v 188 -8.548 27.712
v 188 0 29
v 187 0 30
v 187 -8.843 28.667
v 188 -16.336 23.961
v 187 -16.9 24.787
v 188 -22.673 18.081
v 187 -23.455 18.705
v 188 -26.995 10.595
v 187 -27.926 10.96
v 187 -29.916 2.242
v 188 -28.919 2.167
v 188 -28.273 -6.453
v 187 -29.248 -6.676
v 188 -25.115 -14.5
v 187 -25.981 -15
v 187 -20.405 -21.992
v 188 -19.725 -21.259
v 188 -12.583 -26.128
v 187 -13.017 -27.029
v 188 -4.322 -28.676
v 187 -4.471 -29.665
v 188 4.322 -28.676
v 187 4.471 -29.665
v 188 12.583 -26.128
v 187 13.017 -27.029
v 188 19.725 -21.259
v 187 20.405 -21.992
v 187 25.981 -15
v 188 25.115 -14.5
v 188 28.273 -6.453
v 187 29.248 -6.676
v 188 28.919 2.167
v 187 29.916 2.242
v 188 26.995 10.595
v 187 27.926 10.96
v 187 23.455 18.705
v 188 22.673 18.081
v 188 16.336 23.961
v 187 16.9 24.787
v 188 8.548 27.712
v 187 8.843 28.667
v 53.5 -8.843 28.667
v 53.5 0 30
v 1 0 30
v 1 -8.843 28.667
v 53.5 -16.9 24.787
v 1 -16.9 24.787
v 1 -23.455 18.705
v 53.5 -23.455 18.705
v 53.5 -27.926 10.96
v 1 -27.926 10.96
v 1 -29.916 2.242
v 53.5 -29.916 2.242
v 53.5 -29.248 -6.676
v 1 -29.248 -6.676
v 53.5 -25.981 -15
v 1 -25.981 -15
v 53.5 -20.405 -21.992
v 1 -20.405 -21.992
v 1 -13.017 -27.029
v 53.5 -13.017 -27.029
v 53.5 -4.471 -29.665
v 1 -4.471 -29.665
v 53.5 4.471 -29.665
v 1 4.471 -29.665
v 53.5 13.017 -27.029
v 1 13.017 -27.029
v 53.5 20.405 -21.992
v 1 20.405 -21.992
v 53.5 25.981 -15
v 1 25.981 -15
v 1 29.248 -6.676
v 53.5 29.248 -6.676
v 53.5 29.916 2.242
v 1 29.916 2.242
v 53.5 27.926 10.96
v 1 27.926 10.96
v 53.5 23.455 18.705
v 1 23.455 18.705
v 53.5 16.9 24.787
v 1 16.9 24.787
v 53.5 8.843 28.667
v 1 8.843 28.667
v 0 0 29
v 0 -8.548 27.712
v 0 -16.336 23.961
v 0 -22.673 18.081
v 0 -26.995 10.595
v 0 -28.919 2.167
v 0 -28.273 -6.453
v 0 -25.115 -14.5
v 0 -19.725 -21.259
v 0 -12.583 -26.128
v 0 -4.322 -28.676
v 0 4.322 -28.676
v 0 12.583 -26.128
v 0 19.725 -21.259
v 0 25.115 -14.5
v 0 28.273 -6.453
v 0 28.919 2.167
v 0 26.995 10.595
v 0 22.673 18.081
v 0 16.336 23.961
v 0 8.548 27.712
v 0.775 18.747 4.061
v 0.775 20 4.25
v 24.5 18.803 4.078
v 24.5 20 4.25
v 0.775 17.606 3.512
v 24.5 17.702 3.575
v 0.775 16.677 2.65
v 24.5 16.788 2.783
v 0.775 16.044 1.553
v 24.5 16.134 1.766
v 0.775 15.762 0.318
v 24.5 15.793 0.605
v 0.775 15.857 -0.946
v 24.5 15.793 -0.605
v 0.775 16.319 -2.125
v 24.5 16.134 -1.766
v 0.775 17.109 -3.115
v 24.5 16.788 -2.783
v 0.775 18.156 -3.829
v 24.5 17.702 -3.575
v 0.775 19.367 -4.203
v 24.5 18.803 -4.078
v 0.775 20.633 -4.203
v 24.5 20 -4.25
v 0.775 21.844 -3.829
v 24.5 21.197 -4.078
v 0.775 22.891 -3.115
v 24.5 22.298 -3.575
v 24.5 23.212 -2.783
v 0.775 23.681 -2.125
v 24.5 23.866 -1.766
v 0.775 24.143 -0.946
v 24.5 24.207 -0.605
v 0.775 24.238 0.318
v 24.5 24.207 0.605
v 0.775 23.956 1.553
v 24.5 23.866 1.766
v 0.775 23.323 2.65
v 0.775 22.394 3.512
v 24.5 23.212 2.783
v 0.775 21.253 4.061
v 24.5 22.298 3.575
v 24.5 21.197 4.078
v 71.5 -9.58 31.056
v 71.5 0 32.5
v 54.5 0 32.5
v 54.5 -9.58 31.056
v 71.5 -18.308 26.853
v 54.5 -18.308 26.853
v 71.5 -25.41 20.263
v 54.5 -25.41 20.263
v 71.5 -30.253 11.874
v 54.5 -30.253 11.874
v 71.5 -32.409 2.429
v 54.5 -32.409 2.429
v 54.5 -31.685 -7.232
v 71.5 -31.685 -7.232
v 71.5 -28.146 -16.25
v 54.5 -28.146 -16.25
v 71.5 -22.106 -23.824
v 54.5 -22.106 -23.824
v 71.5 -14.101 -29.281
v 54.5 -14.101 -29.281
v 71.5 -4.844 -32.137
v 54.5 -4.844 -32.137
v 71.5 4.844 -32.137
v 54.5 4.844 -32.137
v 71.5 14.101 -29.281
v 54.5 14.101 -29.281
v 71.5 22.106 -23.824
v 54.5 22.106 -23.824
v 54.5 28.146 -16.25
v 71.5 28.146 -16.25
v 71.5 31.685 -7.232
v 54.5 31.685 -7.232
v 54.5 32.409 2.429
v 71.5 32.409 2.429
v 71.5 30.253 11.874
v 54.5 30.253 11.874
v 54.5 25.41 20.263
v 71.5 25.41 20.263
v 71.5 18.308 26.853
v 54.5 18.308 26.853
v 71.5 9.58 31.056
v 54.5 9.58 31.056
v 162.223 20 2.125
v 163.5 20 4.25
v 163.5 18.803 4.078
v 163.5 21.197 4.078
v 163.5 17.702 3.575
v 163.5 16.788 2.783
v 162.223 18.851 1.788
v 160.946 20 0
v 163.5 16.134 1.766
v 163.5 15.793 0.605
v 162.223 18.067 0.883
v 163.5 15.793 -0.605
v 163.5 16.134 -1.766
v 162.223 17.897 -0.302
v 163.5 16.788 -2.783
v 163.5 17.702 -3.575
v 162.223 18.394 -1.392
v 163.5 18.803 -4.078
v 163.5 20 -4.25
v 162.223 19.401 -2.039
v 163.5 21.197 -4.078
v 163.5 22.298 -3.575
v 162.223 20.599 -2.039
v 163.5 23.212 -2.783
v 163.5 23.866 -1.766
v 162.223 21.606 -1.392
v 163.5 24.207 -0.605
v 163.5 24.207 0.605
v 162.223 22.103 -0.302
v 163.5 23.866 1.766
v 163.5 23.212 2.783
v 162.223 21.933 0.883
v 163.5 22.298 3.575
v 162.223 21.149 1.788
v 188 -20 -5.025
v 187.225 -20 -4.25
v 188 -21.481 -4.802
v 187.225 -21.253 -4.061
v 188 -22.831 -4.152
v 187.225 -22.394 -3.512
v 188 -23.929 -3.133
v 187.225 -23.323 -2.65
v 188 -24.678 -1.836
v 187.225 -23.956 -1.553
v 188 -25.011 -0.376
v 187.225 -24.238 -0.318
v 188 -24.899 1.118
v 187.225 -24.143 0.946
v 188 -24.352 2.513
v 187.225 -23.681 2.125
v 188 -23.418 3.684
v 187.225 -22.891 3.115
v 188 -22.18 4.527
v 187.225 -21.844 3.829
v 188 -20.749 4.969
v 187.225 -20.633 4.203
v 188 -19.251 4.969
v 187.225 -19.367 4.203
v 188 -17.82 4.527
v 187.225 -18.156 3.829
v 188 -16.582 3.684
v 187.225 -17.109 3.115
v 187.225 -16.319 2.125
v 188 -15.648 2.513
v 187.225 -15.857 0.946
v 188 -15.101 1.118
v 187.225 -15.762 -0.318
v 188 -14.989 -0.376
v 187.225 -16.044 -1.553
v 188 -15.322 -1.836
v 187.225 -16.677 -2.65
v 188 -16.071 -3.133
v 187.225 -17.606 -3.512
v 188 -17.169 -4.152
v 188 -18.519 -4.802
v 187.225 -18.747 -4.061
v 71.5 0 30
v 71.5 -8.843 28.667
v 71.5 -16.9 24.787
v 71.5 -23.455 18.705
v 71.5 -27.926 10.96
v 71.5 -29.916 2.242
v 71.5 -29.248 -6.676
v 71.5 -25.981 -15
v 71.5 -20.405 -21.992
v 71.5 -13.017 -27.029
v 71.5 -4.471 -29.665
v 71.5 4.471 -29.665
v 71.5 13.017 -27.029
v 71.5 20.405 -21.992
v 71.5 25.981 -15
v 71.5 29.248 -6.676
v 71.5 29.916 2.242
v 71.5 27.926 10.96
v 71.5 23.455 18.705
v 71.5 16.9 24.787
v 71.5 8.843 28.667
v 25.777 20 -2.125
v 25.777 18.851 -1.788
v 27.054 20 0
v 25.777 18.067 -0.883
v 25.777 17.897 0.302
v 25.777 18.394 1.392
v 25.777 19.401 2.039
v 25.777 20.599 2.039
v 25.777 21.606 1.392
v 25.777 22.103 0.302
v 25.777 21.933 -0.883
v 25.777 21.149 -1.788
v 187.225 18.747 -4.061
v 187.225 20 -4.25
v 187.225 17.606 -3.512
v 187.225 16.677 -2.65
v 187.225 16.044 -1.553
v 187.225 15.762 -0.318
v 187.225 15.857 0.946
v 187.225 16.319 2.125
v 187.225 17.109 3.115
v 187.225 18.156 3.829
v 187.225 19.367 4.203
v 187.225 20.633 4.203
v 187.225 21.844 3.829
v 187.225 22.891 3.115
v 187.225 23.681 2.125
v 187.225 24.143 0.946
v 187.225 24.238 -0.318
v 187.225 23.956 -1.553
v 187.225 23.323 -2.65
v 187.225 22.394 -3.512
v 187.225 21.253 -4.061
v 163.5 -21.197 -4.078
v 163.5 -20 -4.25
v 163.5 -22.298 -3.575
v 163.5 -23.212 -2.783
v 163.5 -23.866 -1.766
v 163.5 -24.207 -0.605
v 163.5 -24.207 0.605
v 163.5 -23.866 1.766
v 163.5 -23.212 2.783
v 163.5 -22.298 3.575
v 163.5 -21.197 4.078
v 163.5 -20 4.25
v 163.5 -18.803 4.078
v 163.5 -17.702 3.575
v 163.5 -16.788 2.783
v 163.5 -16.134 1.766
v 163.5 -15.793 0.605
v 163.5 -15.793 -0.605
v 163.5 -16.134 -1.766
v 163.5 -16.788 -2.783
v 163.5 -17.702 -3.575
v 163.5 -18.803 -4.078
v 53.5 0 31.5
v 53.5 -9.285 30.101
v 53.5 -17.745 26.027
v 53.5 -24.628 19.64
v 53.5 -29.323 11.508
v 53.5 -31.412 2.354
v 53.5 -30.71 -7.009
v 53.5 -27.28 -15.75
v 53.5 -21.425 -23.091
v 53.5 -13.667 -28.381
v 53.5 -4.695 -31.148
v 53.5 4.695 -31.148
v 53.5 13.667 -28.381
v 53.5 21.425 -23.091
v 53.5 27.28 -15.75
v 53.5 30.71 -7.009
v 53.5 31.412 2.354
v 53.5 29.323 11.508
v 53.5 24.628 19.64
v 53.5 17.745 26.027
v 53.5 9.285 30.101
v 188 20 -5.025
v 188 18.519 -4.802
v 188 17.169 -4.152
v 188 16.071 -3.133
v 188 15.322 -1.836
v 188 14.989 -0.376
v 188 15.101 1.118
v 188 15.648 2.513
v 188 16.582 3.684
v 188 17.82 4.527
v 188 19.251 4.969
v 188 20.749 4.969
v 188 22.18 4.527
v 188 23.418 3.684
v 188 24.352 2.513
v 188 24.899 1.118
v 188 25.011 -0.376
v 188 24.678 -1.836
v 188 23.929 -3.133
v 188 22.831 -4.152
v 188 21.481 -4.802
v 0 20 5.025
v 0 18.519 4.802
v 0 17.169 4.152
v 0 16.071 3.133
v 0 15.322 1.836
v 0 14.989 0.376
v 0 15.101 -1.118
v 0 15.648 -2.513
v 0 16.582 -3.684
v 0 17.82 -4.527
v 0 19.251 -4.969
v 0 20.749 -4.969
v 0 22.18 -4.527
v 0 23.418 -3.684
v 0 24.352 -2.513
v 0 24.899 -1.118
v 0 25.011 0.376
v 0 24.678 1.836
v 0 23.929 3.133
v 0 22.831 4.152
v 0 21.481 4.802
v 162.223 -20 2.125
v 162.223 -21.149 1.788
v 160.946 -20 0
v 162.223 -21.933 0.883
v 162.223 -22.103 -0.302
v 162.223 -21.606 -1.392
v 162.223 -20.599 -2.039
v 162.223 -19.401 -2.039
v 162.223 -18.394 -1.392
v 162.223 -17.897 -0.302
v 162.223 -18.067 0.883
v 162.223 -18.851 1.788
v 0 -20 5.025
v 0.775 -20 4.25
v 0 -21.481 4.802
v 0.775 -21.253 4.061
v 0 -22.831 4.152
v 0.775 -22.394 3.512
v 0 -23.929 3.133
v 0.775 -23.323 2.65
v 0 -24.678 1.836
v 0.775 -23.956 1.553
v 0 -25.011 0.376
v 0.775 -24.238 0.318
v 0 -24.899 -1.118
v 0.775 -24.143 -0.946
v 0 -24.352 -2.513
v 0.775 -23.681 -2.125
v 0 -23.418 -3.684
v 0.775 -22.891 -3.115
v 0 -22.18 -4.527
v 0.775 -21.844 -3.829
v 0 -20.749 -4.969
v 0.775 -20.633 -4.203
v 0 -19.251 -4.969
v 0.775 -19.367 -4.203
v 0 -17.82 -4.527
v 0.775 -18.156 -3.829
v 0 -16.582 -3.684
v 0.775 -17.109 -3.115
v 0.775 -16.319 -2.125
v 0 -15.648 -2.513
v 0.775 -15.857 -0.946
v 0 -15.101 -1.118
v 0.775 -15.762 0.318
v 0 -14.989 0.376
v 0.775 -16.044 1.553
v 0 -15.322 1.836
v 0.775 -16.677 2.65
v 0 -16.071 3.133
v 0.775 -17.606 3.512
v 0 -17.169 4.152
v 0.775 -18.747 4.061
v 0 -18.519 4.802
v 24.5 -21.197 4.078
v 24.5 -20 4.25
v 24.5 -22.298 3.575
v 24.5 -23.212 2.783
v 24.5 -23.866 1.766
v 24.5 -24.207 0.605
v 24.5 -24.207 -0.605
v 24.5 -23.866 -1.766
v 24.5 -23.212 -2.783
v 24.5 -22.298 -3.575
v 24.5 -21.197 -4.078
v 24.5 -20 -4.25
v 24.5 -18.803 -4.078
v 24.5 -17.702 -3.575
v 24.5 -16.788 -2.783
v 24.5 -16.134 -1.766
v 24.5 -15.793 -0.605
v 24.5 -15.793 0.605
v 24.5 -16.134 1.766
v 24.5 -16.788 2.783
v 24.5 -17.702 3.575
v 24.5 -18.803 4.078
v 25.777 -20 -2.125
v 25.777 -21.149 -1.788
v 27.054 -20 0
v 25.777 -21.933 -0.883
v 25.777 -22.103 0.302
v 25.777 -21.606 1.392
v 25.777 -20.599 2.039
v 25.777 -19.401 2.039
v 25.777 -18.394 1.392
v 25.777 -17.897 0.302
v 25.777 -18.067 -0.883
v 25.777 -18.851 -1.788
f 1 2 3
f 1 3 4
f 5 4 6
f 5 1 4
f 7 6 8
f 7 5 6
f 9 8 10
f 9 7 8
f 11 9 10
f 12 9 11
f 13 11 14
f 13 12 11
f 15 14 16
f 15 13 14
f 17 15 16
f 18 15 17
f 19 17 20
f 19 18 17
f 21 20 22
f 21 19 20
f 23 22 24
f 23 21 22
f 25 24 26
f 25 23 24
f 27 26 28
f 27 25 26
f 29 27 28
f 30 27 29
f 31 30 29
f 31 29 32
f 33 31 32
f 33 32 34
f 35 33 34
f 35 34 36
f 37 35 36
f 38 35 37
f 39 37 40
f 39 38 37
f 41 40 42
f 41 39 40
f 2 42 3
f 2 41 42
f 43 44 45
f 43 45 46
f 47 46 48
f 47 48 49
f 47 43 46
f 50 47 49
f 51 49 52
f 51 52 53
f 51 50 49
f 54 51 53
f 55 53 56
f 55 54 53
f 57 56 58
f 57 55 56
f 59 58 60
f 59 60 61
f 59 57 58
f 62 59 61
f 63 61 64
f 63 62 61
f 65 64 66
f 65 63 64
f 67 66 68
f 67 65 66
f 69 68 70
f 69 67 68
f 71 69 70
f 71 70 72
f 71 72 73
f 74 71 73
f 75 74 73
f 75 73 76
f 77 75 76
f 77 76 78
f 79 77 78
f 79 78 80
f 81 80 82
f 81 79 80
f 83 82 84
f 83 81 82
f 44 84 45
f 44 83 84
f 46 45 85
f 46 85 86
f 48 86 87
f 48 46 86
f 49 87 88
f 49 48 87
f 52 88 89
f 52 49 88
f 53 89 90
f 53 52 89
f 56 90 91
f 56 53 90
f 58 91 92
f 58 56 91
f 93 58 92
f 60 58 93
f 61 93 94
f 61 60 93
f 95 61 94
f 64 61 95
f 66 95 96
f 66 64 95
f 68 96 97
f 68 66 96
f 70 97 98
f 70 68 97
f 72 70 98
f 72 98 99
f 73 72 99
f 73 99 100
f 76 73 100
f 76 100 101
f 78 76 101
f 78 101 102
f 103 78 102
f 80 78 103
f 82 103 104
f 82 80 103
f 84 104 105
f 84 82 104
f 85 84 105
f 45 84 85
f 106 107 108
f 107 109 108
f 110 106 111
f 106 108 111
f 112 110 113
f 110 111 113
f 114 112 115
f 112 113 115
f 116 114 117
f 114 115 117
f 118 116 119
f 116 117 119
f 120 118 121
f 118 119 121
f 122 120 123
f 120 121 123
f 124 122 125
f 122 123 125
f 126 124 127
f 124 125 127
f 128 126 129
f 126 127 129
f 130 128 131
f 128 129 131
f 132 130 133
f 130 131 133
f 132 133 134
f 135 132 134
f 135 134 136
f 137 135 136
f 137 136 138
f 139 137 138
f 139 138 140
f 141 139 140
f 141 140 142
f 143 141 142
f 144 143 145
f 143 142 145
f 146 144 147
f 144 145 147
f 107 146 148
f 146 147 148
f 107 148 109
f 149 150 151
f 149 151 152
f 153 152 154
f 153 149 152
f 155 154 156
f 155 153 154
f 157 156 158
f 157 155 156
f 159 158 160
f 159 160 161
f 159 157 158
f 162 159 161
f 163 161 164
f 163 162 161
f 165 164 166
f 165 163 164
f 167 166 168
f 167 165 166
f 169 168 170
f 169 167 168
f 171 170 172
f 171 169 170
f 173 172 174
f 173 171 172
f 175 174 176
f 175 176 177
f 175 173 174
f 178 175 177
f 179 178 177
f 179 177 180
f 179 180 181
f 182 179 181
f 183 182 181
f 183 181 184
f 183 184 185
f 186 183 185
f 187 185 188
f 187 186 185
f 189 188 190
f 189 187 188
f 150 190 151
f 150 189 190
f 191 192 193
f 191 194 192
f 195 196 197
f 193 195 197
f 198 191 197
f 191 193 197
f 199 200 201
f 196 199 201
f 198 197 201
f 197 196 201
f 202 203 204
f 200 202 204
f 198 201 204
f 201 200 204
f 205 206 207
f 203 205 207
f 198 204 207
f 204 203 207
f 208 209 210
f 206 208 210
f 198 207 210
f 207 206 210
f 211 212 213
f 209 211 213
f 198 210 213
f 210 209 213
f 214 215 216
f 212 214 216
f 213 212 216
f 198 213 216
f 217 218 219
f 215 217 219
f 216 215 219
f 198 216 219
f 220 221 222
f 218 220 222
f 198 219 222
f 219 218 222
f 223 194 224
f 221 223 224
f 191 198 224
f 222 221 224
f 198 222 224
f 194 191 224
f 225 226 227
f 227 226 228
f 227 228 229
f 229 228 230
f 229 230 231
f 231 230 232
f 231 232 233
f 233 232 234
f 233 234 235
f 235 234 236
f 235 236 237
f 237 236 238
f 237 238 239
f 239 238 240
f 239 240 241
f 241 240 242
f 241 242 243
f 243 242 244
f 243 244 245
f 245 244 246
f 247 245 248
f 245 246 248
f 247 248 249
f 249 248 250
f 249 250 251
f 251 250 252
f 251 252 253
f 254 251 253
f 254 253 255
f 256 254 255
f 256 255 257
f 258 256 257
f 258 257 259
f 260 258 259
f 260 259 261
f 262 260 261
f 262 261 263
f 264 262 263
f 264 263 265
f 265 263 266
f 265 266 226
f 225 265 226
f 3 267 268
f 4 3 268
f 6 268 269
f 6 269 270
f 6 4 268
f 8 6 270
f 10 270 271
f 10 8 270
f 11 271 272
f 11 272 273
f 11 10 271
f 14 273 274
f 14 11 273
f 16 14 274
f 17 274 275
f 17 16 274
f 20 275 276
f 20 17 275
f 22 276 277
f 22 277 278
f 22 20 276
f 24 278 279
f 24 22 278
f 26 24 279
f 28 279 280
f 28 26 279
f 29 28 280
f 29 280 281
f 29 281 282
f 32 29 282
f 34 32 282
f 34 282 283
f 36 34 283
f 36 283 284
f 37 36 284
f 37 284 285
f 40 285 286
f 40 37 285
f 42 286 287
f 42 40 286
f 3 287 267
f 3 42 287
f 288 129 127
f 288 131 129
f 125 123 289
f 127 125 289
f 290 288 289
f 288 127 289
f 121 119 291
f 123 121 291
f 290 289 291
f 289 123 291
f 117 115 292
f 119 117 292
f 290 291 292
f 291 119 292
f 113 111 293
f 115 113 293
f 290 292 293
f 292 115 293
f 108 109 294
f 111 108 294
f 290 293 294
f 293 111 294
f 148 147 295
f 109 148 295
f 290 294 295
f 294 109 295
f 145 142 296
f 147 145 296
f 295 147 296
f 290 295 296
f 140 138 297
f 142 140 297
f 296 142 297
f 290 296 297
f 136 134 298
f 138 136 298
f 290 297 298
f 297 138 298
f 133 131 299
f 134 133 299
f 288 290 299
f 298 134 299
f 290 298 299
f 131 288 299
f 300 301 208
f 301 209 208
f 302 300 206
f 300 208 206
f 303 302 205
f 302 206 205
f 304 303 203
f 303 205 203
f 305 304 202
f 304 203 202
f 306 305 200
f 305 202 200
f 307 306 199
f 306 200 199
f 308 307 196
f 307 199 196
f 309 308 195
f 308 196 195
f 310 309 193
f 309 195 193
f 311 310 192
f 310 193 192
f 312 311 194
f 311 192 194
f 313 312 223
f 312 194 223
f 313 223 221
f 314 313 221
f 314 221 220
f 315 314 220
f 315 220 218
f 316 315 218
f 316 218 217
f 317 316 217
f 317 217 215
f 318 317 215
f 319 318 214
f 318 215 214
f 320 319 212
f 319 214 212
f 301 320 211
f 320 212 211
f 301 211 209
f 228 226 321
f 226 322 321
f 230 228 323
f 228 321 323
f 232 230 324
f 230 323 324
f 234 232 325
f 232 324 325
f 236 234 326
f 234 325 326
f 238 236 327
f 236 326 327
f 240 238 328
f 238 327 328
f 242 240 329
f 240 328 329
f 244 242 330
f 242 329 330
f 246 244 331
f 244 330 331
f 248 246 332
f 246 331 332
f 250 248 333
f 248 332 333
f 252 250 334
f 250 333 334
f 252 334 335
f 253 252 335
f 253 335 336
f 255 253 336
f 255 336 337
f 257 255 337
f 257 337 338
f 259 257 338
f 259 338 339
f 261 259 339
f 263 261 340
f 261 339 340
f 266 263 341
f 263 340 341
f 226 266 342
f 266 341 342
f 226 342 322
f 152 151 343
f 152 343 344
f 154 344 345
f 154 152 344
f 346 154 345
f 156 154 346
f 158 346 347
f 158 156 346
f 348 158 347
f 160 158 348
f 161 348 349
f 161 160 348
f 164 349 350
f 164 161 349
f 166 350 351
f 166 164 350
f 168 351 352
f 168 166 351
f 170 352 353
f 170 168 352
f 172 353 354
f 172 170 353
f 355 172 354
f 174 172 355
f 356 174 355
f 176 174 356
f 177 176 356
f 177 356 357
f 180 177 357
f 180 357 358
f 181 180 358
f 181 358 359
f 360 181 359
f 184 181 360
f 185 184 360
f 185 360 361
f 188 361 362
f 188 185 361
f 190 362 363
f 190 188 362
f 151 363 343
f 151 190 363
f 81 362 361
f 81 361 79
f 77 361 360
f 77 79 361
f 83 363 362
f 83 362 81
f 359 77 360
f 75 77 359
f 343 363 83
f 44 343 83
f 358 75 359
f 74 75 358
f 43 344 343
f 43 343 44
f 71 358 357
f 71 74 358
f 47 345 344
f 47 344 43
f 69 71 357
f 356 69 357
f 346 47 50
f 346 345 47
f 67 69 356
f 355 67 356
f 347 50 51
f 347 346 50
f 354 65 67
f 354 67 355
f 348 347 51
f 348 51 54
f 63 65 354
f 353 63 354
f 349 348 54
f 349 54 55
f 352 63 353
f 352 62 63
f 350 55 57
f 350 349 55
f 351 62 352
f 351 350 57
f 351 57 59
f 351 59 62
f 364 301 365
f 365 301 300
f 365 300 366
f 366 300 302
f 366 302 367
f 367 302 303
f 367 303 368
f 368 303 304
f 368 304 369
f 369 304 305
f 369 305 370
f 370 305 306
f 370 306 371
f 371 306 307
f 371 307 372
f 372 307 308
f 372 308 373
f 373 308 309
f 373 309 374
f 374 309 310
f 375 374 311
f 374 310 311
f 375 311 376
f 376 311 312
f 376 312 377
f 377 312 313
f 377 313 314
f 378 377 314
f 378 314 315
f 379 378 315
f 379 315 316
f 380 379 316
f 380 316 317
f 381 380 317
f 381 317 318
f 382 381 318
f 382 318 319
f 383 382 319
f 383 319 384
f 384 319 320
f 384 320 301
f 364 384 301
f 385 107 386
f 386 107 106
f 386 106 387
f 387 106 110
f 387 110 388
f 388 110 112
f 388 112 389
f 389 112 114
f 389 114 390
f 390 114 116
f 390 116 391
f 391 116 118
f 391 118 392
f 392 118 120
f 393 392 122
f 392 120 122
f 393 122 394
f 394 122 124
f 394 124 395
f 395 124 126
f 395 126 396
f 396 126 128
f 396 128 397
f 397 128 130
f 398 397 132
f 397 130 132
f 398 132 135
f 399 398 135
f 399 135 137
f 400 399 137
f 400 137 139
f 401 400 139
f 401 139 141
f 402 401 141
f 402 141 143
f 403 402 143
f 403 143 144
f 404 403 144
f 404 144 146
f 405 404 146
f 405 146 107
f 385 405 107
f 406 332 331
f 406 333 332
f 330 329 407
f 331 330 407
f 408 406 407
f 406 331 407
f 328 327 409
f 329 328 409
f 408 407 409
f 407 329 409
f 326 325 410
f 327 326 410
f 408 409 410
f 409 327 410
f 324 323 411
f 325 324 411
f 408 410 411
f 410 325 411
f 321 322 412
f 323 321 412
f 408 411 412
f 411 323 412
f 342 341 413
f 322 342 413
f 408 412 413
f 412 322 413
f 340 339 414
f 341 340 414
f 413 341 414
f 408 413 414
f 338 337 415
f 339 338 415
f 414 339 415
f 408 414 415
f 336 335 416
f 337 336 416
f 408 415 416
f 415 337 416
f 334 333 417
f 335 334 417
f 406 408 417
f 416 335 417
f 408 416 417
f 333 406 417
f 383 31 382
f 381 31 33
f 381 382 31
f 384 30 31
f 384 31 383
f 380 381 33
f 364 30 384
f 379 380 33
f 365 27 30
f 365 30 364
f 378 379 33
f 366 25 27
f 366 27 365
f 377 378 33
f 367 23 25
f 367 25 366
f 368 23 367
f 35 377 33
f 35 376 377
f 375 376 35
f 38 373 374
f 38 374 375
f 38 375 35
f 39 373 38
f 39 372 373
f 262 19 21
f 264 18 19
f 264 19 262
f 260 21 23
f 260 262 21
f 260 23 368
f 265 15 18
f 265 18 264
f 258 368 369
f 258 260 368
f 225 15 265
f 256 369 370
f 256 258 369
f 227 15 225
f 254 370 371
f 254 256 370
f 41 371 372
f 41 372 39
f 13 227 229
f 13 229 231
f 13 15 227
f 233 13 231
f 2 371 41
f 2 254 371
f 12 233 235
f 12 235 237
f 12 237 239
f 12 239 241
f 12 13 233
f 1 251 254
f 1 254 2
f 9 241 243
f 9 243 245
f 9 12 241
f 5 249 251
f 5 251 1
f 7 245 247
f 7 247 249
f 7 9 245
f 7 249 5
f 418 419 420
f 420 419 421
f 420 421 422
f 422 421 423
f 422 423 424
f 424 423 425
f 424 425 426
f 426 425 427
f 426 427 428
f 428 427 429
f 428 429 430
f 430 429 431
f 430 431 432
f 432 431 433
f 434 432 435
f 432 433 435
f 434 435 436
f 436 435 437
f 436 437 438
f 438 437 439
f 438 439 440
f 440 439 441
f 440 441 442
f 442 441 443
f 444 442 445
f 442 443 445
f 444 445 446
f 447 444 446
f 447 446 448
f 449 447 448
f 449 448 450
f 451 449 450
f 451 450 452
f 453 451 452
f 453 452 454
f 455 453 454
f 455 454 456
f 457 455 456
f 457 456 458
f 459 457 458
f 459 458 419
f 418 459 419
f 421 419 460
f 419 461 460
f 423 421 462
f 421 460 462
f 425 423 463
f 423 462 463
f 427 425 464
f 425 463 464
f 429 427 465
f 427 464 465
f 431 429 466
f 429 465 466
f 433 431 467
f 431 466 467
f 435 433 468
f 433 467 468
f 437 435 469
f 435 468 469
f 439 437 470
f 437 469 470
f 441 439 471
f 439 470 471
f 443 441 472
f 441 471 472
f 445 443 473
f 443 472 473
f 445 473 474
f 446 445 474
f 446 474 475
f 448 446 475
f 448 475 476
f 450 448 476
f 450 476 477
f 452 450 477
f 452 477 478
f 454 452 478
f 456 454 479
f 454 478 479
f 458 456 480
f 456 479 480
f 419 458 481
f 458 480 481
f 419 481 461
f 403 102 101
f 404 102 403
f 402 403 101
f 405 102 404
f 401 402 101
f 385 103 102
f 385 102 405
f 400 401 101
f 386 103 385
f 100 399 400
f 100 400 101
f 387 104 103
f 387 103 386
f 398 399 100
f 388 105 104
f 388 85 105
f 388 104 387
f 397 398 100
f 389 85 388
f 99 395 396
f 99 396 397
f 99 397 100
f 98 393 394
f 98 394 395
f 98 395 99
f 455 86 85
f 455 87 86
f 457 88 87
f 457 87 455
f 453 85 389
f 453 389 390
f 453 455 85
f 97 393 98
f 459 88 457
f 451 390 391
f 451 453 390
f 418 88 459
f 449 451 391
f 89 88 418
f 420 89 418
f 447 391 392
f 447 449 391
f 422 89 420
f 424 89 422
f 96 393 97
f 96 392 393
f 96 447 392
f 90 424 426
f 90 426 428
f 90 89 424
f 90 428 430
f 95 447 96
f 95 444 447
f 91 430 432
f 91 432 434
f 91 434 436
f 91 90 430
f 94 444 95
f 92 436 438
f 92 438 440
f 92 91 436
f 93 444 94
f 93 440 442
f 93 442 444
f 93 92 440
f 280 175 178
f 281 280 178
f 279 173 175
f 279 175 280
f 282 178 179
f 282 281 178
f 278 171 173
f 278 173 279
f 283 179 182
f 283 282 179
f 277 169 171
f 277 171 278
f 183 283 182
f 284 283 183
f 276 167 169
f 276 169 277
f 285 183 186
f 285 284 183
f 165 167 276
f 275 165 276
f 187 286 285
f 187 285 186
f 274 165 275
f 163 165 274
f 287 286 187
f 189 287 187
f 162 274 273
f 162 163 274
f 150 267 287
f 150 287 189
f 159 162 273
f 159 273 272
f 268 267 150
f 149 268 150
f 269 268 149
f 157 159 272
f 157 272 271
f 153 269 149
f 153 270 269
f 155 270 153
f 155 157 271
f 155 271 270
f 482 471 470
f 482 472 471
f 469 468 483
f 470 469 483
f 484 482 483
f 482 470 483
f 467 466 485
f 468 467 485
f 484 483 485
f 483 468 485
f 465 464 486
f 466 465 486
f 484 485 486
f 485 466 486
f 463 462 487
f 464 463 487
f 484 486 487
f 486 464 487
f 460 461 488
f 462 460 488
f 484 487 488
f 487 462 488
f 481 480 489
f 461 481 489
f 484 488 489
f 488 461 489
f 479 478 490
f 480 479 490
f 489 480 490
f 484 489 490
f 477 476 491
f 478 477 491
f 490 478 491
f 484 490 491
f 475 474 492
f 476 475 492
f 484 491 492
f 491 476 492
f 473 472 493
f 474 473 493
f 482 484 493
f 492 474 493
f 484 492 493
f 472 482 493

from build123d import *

# Parameters (mm, degrees)
M10_TAPPED_HOLE1_D           = 8.5
M10_TAPPED_HOLE1_DEPTH       = 24.5
M10_TAPPED_HOLE1_CSINK_D     = 10.05
M10_TAPPED_HOLE1_CSINK_ANGLE = 90
M10_TAPPED_HOLE1_TIP         = 2.553657631
M10_TAPPED_HOLE2_D           = 8.5
M10_TAPPED_HOLE2_DEPTH       = 24.5
M10_TAPPED_HOLE2_CSINK_D     = 10.05
M10_TAPPED_HOLE2_CSINK_ANGLE = 90
M10_TAPPED_HOLE2_TIP         = 2.553657631
CHAMFER1_SIZE                = 1


with BuildPart() as part:
    # Sketch1 → Revolve1 (revolve)
    with BuildSketch(Plane.XY, mode=Mode.PRIVATE) as revolve1_sk:
        Polygon((0, 0), (0, 30), (53.5, 30), (53.5, 32.5), (71.5, 32.5), (71.5, 30), (188, 30), (188, 0), align=None)
    revolve(revolve1_sk.sketch.rotate(Axis((0, 0, 0), (1, 0, 0)), 90), axis=Axis((0, 0, 0), (1, 0, 0)))

    # M10 Tapped Hole1
    with Locations(Plane(origin=(0, 20, 0), x_dir=(0, 0, -1), z_dir=(-1, 0, 0))):
        with Locations((0, 0), (0, 40)):
            CounterSinkHole(M10_TAPPED_HOLE1_D / 2, M10_TAPPED_HOLE1_CSINK_D / 2, depth=M10_TAPPED_HOLE1_DEPTH, counter_sink_angle=M10_TAPPED_HOLE1_CSINK_ANGLE)
            with Locations((0, 0, -(M10_TAPPED_HOLE1_DEPTH + M10_TAPPED_HOLE1_TIP / 2))):  # 118° drill point
                Cone(0, M10_TAPPED_HOLE1_D / 2, M10_TAPPED_HOLE1_TIP, mode=Mode.SUBTRACT)

    # M10 Tapped Hole2
    with Locations(Plane(origin=(188, 20, 0), x_dir=(0, 0, 1), z_dir=(1, 0, 0))):
        with Locations((0, 0), (0, 40)):
            CounterSinkHole(M10_TAPPED_HOLE2_D / 2, M10_TAPPED_HOLE2_CSINK_D / 2, depth=M10_TAPPED_HOLE2_DEPTH, counter_sink_angle=M10_TAPPED_HOLE2_CSINK_ANGLE)
            with Locations((0, 0, -(M10_TAPPED_HOLE2_DEPTH + M10_TAPPED_HOLE2_TIP / 2))):  # 118° drill point
                Cone(0, M10_TAPPED_HOLE2_D / 2, M10_TAPPED_HOLE2_TIP, mode=Mode.SUBTRACT)

    # Chamfer1
    chamfer1_edges = [part.edges().sort_by_distance(p)[0] for p in [
        (0, 0, -30),
        (53.5, 0, -32.5),
        (188, 0, -30),
    ]]
    chamfer(chamfer1_edges, length=CHAMFER1_SIZE)


solid = part.part
